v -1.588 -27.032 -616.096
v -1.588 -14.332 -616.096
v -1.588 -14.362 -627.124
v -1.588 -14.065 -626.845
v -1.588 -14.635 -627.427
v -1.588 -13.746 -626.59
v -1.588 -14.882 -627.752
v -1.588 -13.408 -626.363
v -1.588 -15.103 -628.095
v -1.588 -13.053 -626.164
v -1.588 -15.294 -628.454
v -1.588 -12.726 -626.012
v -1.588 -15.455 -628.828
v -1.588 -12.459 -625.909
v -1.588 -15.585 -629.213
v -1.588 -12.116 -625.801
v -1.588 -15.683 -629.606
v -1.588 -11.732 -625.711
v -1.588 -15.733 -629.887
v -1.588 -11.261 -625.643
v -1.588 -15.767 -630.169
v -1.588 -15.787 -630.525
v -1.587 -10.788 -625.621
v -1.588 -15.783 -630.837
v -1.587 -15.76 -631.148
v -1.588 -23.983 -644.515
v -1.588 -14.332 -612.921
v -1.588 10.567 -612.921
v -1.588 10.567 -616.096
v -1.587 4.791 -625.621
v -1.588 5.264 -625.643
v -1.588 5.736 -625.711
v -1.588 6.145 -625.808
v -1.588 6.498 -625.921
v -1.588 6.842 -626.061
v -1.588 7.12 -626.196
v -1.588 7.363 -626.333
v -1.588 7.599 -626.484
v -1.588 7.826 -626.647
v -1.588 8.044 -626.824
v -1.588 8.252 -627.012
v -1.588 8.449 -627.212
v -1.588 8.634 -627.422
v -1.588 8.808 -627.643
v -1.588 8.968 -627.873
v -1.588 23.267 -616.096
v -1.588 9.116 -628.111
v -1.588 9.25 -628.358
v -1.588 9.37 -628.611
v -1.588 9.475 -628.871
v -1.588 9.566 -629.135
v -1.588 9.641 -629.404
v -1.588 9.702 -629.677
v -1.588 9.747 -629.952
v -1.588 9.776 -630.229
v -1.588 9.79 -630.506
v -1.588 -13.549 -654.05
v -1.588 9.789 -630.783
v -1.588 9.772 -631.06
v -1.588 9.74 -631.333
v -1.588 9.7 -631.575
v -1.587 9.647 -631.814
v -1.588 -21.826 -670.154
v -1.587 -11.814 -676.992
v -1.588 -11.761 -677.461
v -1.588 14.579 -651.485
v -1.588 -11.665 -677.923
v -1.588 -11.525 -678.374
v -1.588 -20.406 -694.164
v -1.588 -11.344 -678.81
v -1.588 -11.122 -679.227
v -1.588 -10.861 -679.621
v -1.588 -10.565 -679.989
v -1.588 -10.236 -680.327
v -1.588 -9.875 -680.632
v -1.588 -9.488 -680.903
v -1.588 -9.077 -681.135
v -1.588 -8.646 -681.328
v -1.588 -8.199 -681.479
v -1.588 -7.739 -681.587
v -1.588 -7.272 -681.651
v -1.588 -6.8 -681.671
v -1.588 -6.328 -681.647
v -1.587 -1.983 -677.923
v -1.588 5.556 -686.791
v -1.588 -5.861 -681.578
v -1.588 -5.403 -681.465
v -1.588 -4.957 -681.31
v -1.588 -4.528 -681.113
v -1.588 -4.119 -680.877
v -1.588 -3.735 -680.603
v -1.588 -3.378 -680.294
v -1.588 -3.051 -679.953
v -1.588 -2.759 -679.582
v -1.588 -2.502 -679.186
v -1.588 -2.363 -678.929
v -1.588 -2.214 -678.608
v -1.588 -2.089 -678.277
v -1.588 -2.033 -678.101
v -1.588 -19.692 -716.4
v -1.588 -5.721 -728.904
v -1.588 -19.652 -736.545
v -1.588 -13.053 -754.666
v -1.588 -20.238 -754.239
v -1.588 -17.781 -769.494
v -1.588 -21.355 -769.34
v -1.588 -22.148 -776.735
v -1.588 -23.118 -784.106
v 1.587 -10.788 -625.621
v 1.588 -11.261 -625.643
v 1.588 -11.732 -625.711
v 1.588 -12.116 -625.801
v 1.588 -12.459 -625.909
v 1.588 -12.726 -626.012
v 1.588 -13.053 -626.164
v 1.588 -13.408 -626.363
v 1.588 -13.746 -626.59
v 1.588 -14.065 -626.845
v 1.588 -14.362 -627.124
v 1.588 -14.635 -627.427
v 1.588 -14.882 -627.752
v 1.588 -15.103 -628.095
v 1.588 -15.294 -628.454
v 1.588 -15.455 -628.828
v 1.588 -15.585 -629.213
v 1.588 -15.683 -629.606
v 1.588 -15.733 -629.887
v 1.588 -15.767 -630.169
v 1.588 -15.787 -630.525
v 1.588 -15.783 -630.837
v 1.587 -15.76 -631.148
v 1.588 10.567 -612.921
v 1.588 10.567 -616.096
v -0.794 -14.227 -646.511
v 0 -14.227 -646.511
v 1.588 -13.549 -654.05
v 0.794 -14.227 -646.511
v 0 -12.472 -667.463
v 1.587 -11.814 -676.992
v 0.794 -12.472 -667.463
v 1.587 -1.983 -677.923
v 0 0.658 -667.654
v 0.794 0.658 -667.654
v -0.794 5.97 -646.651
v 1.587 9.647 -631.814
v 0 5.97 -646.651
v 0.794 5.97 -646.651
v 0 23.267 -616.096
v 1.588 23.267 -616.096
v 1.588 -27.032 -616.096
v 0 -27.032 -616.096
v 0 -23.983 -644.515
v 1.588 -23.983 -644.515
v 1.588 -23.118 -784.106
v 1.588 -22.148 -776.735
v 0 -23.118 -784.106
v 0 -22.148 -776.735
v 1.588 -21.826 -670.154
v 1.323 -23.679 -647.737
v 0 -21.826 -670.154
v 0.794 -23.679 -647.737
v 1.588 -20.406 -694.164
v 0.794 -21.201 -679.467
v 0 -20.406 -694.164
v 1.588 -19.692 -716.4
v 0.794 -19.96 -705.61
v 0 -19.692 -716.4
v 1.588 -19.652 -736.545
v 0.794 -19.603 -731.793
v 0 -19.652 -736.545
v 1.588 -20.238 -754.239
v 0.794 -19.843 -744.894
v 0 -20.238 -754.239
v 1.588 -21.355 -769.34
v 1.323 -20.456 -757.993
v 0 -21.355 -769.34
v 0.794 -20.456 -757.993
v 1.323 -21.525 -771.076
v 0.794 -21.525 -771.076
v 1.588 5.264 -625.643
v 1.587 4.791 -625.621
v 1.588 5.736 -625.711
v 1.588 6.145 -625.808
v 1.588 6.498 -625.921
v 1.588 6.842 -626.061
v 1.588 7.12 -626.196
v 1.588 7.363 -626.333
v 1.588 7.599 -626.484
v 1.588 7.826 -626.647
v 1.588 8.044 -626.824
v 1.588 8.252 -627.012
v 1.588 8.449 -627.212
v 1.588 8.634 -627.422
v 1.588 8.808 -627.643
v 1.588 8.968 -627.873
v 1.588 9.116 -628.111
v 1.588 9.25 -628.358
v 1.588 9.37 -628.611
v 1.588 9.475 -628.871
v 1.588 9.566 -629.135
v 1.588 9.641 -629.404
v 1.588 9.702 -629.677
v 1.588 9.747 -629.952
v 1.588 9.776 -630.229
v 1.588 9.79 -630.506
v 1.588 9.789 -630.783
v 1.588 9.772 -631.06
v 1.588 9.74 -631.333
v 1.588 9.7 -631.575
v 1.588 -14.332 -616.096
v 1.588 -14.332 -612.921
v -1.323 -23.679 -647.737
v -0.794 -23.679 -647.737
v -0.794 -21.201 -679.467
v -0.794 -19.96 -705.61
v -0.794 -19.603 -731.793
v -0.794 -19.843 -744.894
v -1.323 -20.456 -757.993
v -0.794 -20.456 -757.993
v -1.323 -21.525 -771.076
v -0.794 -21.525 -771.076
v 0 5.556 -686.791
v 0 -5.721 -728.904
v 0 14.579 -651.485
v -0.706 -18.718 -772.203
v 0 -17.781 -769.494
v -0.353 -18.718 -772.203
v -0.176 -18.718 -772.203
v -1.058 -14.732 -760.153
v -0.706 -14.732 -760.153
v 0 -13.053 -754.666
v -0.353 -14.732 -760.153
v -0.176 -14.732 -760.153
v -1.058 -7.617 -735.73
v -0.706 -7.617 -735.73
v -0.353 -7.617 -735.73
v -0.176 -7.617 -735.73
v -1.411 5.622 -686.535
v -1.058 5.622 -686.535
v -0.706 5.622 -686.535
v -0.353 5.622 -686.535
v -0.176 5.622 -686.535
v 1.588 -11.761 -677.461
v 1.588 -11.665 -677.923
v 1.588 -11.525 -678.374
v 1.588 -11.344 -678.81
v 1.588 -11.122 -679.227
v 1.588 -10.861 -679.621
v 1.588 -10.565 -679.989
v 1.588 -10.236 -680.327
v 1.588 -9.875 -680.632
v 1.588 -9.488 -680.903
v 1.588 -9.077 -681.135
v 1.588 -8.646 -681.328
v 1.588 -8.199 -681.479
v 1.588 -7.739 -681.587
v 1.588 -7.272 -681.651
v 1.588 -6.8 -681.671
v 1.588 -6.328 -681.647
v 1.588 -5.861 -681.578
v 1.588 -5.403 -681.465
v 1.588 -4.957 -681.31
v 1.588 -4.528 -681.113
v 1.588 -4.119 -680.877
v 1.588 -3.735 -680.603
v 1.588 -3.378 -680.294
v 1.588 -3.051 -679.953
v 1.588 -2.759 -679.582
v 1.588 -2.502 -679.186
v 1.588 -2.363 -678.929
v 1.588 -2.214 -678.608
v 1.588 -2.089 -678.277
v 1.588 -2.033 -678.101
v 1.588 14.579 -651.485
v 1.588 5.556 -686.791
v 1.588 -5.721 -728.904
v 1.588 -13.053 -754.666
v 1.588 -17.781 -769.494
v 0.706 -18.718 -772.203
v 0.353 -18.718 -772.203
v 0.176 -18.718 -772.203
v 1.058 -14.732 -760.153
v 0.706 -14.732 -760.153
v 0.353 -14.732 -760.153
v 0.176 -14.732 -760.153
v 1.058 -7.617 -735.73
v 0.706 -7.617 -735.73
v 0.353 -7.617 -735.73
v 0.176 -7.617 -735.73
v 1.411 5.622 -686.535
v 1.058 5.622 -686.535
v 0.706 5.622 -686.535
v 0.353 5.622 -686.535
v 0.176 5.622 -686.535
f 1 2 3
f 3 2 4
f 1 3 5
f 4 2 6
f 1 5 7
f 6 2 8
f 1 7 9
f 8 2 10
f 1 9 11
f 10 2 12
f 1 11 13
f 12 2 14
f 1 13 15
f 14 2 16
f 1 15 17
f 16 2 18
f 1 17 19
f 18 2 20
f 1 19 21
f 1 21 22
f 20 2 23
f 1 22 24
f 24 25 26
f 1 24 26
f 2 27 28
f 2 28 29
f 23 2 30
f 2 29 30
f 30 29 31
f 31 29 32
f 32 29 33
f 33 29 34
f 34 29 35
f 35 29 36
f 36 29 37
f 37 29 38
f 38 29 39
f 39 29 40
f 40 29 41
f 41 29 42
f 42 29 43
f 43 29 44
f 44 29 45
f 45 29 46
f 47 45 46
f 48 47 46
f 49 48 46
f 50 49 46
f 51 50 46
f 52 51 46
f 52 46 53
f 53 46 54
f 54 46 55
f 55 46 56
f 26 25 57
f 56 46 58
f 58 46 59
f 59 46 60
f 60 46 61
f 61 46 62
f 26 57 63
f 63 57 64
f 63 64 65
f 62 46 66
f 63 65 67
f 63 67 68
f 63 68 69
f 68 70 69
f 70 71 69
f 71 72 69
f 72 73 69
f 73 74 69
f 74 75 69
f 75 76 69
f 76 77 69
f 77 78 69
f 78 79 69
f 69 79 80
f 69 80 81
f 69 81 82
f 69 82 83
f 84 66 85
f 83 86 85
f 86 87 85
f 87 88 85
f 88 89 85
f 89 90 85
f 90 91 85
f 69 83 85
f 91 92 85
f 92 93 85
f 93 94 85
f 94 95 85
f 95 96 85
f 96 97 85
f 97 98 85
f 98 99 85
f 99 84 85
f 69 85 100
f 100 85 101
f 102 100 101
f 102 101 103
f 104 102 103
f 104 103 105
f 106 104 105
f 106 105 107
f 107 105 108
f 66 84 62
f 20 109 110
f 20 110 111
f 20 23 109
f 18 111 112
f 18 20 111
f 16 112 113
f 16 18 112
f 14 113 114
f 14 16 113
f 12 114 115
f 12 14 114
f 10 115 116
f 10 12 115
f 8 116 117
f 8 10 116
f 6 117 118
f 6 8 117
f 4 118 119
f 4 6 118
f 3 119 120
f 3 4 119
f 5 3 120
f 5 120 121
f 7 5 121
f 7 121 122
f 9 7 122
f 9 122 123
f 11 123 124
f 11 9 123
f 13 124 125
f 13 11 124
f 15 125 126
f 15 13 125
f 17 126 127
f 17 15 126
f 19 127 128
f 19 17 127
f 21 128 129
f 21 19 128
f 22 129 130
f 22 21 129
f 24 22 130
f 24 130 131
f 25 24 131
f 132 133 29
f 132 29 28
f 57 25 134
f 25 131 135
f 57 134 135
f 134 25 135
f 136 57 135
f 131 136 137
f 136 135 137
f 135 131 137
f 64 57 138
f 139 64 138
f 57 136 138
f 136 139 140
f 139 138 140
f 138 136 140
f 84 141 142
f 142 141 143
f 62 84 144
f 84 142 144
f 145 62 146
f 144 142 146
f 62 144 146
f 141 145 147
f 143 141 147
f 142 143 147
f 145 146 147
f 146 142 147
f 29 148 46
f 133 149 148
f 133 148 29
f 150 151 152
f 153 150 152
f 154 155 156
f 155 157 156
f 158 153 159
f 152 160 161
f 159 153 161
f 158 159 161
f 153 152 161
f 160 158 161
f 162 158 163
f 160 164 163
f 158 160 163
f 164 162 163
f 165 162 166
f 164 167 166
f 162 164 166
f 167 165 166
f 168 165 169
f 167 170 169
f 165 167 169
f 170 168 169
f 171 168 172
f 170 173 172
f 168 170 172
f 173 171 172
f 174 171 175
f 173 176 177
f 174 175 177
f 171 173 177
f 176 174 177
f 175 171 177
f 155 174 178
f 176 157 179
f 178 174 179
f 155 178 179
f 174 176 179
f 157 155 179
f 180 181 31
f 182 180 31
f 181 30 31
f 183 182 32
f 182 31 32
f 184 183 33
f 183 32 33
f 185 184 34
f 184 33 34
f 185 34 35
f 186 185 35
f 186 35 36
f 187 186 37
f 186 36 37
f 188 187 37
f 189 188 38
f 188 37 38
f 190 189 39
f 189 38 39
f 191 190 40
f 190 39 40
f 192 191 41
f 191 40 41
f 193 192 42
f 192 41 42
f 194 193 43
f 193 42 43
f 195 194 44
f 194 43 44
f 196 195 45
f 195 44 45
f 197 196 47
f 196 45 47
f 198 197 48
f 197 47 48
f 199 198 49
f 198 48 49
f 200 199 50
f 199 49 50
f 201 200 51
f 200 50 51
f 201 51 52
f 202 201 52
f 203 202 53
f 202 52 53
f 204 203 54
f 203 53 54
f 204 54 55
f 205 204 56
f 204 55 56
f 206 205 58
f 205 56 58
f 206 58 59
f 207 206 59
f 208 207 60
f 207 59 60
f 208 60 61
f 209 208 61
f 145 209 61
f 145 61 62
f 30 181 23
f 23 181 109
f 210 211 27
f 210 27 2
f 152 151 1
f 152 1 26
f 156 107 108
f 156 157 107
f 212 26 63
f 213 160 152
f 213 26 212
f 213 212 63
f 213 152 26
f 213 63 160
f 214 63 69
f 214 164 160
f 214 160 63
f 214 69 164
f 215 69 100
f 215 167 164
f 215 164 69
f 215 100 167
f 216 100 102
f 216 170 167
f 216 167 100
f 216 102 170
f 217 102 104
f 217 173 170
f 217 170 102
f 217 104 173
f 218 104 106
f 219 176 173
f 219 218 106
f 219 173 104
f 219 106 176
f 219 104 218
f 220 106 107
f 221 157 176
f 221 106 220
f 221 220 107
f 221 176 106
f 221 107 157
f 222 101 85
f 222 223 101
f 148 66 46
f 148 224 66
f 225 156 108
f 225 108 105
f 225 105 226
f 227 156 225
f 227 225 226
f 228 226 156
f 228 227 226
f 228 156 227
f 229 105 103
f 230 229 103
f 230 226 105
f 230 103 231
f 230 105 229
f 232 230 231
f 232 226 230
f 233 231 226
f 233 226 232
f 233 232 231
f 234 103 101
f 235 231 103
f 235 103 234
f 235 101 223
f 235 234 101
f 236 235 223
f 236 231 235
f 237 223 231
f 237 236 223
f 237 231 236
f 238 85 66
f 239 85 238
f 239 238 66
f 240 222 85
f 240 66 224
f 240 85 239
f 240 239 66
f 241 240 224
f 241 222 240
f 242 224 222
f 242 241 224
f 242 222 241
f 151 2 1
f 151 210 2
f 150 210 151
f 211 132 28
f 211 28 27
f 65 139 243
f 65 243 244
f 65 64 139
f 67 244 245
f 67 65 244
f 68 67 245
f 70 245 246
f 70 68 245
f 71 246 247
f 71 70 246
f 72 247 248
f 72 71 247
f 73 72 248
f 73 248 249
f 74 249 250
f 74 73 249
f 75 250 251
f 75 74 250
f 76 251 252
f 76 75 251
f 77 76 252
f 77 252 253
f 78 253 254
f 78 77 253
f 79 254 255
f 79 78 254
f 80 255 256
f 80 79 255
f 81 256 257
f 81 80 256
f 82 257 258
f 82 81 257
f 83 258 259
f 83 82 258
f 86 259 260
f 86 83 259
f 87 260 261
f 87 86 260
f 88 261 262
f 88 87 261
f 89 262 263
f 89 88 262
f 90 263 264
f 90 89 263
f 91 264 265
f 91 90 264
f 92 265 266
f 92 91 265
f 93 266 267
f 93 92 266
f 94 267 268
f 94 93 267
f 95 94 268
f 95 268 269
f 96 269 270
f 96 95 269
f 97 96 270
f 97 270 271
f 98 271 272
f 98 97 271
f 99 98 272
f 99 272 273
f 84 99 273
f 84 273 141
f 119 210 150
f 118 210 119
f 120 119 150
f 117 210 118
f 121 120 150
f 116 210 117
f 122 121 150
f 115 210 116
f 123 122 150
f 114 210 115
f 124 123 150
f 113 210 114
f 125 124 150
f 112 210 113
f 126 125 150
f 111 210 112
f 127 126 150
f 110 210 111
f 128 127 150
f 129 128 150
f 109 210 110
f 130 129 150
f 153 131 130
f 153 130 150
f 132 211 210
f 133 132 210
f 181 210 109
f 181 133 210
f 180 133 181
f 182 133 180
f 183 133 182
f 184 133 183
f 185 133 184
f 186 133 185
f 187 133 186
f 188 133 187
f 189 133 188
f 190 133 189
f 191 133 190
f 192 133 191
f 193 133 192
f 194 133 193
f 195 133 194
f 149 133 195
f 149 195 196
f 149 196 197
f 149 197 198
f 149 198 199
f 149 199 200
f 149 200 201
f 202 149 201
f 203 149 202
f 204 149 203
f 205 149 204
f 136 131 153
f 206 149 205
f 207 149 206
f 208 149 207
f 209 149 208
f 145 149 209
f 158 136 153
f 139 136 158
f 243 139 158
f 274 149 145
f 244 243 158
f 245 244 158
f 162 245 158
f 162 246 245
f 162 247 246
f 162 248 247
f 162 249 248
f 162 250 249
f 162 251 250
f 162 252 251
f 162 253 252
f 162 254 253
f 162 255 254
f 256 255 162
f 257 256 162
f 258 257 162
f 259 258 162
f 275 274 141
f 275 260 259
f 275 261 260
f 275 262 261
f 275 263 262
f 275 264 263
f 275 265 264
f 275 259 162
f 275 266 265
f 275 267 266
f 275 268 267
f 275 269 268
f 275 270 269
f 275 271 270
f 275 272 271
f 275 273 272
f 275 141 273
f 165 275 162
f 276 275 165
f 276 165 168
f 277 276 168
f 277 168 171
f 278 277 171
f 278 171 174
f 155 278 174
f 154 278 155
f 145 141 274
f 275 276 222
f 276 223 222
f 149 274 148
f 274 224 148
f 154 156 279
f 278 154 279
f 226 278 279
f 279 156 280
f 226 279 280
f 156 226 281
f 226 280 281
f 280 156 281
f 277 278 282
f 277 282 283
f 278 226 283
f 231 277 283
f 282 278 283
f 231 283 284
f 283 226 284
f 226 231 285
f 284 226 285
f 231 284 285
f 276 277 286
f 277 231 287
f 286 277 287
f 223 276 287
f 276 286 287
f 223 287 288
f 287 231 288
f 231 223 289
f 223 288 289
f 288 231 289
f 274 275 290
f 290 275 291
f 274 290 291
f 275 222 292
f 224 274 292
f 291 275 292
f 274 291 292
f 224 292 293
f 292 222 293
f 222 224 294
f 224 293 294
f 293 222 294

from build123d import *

# Parameters (mm, degrees)
BOSS_EXTRUDE1_DEPTH     = 1.5875
CUT_EXTRUDE2_DEPTH      = 785.578740099
CUT_EXTRUDE2_DEPTH_BACK = 785.578740099
FILLET2_R               = 5


with BuildPart() as part:
    # Sketch1 → Boss-Extrude1 (new, symmetric)
    with BuildSketch(Plane(origin=(0, 0, 0), x_dir=(0, 0, -1), z_dir=(1, 0, 0))):
        with BuildLine():
            add(Edge.make_bspline(
                [(784.106482277, -23.118423177), (780.160330067, -21.594194865), (772.229019431, -18.642031364), (760.174514143, -14.672159257), (747.991113763, -11.061270892), (731.645658465, -6.455954447), (711.176791695, -0.845295729), (679.558994763, 7.487552705), (651.983641844, 14.499561744), (628.478216713, 20.27753038), (620.224641654, 22.275465986), (616.096053399, 23.266700138)],
                knots=[0.02229965, 0.02229965, 0.02229965, 0.02229965, 0.037574888, 0.052850126, 0.068125363, 0.083400601, 0.113951077, 0.144501553, 0.201029282, 0.21630452, 0.231579758, 0.231579758, 0.231579758, 0.231579758], degree=3))
            Line((616.096053399, 23.266700138), (616.096053399, 10.566700138))
            Line((616.096053399, 10.566700138), (612.921053399, 10.566700138))
            Line((612.921053399, 10.566700138), (612.921053399, -14.332259955))
            Line((612.921053399, -14.332259955), (616.096053399, -14.332259955))
            Line((616.096053399, -14.332259955), (616.096053399, -27.032259955))
            add(Edge.make_bspline(
                [(616.096053399, -27.032259955), (620.425080515, -26.520992099), (641.501106895, -24.130719251), (671.327266418, -21.474905507), (705.603952791, -19.816296976), (731.789031329, -19.412207677), (758.000345874, -20.150218902), (775.446944988, -21.867269156), (784.106482277, -23.118423177)],
                knots=[0.781625681, 0.781625681, 0.781625681, 0.781625681, 0.796909794, 0.855992653, 0.886560878, 0.917129102, 0.947697327, 0.978265551, 0.978265551, 0.978265551, 0.978265551], degree=3))
        make_face()
    extrude(amount=BOSS_EXTRUDE1_DEPTH, both=True)

    # Sketch3 → Cut-Extrude2 (cut, two sides: drawn at the far end of the back side and taken through both)
    with BuildSketch(Plane.ZY.offset(1.5875).offset(-CUT_EXTRUDE2_DEPTH_BACK)):
        with BuildLine():
            add(Edge.make_bspline(
                [(-709.553781789, -10.315598481), (-702.586088902, -8.439955555), (-688.640319728, -4.750192135), (-667.656705928, 0.677236447), (-646.655315148, 5.990494954), (-632.636020902, 9.452460216), (-625.621053399, 11.162422894)],
                knots=[0.0368347, 0.0368347, 0.0368347, 0.0368347, 0.062876694, 0.088918688, 0.114960682, 0.141002675, 0.141002675, 0.141002675, 0.141002675], degree=3))
            Line((-625.621053399, 11.162422894), (-625.621053399, 10.566700138))
            Line((-625.621053399, 10.566700138), (-625.621053399, -14.332259955))
            Line((-625.621053399, -14.332259955), (-625.621053399, -16.357533681))
            add(Edge.make_bspline(
                [(-625.621053399, -16.357533681), (-632.578353092, -15.590470377), (-646.498309301, -14.164913642), (-667.45488798, -12.400335024), (-688.462893644, -11.065289582), (-702.525237077, -10.501699929), (-709.553781789, -10.315598481)],
                knots=[0.868429492, 0.868429492, 0.868429492, 0.868429492, 0.892780479, 0.917131465, 0.941482452, 0.965833439, 0.965833439, 0.965833439, 0.965833439], degree=3))
        make_face()
    extrude(amount=CUT_EXTRUDE2_DEPTH + CUT_EXTRUDE2_DEPTH_BACK, mode=Mode.SUBTRACT)

    # Fillet2
    fillet2_edges = [part.edges().sort_by_distance(p)[0] for p in [
        (0, 11.162422894, -625.621053399),
        (0, -16.357533681, -625.621053399),
        (0, -10.315598481, -709.553781789),
    ]]
    fillet(fillet2_edges, radius=FILLET2_R)


solid = part.part
